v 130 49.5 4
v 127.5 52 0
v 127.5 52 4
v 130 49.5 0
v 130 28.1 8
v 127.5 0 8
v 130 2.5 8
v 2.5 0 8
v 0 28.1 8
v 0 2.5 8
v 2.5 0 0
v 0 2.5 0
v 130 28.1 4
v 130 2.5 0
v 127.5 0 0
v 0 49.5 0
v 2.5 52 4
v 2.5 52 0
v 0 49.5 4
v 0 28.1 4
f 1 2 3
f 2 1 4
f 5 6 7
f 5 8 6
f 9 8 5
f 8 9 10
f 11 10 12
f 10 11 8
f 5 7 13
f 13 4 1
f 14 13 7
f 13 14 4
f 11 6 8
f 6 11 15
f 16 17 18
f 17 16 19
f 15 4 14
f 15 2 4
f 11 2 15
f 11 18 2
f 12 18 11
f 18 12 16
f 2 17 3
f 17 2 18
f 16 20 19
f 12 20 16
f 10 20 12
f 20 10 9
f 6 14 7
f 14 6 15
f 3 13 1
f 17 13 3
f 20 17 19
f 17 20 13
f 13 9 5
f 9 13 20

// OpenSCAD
$fn = 32;

// ----------------------------------------------------------------------
// Stepped bar: sidestep, 130 x 52 x 8/4 mm
// ----------------------------------------------------------------------

// --- parameters (mm) ---
bar_l = 130;              // bar length, X
bar_w = 52;               // bar width, Y
plate_t = 8;              // thickness of the thick zone, Z
thin_t = 4;               // thickness of the thin zone
corner_c = 2.5;           // corner chamfer of the bar
step_cut = 4;             // material removed from the thin zone
ledge_y = 28.1;           // start of the ledge from the front edge
depth_1 = 4;              // depth of cut 1 from the top face

profile = [[2.5, 0], [127.5, 0], [130, 2.5], [130, 49.5], [127.5, 52], [2.5, 52], [0, 49.5], [0, 2.5]];  // primary outline, 8 points, counter clockwise
void_1 = [[-1, 28.1], [131, 28.1], [131, 53], [-1, 53]];  // ledge cut along one edge, 4 points

// --- the one profile operation ---
difference() {
  linear_extrude(height = plate_t) polygon(points = profile);
  translate([0, 0, plate_t - depth_1])
    linear_extrude(height = depth_1 + 1) polygon(points = void_1);
}
